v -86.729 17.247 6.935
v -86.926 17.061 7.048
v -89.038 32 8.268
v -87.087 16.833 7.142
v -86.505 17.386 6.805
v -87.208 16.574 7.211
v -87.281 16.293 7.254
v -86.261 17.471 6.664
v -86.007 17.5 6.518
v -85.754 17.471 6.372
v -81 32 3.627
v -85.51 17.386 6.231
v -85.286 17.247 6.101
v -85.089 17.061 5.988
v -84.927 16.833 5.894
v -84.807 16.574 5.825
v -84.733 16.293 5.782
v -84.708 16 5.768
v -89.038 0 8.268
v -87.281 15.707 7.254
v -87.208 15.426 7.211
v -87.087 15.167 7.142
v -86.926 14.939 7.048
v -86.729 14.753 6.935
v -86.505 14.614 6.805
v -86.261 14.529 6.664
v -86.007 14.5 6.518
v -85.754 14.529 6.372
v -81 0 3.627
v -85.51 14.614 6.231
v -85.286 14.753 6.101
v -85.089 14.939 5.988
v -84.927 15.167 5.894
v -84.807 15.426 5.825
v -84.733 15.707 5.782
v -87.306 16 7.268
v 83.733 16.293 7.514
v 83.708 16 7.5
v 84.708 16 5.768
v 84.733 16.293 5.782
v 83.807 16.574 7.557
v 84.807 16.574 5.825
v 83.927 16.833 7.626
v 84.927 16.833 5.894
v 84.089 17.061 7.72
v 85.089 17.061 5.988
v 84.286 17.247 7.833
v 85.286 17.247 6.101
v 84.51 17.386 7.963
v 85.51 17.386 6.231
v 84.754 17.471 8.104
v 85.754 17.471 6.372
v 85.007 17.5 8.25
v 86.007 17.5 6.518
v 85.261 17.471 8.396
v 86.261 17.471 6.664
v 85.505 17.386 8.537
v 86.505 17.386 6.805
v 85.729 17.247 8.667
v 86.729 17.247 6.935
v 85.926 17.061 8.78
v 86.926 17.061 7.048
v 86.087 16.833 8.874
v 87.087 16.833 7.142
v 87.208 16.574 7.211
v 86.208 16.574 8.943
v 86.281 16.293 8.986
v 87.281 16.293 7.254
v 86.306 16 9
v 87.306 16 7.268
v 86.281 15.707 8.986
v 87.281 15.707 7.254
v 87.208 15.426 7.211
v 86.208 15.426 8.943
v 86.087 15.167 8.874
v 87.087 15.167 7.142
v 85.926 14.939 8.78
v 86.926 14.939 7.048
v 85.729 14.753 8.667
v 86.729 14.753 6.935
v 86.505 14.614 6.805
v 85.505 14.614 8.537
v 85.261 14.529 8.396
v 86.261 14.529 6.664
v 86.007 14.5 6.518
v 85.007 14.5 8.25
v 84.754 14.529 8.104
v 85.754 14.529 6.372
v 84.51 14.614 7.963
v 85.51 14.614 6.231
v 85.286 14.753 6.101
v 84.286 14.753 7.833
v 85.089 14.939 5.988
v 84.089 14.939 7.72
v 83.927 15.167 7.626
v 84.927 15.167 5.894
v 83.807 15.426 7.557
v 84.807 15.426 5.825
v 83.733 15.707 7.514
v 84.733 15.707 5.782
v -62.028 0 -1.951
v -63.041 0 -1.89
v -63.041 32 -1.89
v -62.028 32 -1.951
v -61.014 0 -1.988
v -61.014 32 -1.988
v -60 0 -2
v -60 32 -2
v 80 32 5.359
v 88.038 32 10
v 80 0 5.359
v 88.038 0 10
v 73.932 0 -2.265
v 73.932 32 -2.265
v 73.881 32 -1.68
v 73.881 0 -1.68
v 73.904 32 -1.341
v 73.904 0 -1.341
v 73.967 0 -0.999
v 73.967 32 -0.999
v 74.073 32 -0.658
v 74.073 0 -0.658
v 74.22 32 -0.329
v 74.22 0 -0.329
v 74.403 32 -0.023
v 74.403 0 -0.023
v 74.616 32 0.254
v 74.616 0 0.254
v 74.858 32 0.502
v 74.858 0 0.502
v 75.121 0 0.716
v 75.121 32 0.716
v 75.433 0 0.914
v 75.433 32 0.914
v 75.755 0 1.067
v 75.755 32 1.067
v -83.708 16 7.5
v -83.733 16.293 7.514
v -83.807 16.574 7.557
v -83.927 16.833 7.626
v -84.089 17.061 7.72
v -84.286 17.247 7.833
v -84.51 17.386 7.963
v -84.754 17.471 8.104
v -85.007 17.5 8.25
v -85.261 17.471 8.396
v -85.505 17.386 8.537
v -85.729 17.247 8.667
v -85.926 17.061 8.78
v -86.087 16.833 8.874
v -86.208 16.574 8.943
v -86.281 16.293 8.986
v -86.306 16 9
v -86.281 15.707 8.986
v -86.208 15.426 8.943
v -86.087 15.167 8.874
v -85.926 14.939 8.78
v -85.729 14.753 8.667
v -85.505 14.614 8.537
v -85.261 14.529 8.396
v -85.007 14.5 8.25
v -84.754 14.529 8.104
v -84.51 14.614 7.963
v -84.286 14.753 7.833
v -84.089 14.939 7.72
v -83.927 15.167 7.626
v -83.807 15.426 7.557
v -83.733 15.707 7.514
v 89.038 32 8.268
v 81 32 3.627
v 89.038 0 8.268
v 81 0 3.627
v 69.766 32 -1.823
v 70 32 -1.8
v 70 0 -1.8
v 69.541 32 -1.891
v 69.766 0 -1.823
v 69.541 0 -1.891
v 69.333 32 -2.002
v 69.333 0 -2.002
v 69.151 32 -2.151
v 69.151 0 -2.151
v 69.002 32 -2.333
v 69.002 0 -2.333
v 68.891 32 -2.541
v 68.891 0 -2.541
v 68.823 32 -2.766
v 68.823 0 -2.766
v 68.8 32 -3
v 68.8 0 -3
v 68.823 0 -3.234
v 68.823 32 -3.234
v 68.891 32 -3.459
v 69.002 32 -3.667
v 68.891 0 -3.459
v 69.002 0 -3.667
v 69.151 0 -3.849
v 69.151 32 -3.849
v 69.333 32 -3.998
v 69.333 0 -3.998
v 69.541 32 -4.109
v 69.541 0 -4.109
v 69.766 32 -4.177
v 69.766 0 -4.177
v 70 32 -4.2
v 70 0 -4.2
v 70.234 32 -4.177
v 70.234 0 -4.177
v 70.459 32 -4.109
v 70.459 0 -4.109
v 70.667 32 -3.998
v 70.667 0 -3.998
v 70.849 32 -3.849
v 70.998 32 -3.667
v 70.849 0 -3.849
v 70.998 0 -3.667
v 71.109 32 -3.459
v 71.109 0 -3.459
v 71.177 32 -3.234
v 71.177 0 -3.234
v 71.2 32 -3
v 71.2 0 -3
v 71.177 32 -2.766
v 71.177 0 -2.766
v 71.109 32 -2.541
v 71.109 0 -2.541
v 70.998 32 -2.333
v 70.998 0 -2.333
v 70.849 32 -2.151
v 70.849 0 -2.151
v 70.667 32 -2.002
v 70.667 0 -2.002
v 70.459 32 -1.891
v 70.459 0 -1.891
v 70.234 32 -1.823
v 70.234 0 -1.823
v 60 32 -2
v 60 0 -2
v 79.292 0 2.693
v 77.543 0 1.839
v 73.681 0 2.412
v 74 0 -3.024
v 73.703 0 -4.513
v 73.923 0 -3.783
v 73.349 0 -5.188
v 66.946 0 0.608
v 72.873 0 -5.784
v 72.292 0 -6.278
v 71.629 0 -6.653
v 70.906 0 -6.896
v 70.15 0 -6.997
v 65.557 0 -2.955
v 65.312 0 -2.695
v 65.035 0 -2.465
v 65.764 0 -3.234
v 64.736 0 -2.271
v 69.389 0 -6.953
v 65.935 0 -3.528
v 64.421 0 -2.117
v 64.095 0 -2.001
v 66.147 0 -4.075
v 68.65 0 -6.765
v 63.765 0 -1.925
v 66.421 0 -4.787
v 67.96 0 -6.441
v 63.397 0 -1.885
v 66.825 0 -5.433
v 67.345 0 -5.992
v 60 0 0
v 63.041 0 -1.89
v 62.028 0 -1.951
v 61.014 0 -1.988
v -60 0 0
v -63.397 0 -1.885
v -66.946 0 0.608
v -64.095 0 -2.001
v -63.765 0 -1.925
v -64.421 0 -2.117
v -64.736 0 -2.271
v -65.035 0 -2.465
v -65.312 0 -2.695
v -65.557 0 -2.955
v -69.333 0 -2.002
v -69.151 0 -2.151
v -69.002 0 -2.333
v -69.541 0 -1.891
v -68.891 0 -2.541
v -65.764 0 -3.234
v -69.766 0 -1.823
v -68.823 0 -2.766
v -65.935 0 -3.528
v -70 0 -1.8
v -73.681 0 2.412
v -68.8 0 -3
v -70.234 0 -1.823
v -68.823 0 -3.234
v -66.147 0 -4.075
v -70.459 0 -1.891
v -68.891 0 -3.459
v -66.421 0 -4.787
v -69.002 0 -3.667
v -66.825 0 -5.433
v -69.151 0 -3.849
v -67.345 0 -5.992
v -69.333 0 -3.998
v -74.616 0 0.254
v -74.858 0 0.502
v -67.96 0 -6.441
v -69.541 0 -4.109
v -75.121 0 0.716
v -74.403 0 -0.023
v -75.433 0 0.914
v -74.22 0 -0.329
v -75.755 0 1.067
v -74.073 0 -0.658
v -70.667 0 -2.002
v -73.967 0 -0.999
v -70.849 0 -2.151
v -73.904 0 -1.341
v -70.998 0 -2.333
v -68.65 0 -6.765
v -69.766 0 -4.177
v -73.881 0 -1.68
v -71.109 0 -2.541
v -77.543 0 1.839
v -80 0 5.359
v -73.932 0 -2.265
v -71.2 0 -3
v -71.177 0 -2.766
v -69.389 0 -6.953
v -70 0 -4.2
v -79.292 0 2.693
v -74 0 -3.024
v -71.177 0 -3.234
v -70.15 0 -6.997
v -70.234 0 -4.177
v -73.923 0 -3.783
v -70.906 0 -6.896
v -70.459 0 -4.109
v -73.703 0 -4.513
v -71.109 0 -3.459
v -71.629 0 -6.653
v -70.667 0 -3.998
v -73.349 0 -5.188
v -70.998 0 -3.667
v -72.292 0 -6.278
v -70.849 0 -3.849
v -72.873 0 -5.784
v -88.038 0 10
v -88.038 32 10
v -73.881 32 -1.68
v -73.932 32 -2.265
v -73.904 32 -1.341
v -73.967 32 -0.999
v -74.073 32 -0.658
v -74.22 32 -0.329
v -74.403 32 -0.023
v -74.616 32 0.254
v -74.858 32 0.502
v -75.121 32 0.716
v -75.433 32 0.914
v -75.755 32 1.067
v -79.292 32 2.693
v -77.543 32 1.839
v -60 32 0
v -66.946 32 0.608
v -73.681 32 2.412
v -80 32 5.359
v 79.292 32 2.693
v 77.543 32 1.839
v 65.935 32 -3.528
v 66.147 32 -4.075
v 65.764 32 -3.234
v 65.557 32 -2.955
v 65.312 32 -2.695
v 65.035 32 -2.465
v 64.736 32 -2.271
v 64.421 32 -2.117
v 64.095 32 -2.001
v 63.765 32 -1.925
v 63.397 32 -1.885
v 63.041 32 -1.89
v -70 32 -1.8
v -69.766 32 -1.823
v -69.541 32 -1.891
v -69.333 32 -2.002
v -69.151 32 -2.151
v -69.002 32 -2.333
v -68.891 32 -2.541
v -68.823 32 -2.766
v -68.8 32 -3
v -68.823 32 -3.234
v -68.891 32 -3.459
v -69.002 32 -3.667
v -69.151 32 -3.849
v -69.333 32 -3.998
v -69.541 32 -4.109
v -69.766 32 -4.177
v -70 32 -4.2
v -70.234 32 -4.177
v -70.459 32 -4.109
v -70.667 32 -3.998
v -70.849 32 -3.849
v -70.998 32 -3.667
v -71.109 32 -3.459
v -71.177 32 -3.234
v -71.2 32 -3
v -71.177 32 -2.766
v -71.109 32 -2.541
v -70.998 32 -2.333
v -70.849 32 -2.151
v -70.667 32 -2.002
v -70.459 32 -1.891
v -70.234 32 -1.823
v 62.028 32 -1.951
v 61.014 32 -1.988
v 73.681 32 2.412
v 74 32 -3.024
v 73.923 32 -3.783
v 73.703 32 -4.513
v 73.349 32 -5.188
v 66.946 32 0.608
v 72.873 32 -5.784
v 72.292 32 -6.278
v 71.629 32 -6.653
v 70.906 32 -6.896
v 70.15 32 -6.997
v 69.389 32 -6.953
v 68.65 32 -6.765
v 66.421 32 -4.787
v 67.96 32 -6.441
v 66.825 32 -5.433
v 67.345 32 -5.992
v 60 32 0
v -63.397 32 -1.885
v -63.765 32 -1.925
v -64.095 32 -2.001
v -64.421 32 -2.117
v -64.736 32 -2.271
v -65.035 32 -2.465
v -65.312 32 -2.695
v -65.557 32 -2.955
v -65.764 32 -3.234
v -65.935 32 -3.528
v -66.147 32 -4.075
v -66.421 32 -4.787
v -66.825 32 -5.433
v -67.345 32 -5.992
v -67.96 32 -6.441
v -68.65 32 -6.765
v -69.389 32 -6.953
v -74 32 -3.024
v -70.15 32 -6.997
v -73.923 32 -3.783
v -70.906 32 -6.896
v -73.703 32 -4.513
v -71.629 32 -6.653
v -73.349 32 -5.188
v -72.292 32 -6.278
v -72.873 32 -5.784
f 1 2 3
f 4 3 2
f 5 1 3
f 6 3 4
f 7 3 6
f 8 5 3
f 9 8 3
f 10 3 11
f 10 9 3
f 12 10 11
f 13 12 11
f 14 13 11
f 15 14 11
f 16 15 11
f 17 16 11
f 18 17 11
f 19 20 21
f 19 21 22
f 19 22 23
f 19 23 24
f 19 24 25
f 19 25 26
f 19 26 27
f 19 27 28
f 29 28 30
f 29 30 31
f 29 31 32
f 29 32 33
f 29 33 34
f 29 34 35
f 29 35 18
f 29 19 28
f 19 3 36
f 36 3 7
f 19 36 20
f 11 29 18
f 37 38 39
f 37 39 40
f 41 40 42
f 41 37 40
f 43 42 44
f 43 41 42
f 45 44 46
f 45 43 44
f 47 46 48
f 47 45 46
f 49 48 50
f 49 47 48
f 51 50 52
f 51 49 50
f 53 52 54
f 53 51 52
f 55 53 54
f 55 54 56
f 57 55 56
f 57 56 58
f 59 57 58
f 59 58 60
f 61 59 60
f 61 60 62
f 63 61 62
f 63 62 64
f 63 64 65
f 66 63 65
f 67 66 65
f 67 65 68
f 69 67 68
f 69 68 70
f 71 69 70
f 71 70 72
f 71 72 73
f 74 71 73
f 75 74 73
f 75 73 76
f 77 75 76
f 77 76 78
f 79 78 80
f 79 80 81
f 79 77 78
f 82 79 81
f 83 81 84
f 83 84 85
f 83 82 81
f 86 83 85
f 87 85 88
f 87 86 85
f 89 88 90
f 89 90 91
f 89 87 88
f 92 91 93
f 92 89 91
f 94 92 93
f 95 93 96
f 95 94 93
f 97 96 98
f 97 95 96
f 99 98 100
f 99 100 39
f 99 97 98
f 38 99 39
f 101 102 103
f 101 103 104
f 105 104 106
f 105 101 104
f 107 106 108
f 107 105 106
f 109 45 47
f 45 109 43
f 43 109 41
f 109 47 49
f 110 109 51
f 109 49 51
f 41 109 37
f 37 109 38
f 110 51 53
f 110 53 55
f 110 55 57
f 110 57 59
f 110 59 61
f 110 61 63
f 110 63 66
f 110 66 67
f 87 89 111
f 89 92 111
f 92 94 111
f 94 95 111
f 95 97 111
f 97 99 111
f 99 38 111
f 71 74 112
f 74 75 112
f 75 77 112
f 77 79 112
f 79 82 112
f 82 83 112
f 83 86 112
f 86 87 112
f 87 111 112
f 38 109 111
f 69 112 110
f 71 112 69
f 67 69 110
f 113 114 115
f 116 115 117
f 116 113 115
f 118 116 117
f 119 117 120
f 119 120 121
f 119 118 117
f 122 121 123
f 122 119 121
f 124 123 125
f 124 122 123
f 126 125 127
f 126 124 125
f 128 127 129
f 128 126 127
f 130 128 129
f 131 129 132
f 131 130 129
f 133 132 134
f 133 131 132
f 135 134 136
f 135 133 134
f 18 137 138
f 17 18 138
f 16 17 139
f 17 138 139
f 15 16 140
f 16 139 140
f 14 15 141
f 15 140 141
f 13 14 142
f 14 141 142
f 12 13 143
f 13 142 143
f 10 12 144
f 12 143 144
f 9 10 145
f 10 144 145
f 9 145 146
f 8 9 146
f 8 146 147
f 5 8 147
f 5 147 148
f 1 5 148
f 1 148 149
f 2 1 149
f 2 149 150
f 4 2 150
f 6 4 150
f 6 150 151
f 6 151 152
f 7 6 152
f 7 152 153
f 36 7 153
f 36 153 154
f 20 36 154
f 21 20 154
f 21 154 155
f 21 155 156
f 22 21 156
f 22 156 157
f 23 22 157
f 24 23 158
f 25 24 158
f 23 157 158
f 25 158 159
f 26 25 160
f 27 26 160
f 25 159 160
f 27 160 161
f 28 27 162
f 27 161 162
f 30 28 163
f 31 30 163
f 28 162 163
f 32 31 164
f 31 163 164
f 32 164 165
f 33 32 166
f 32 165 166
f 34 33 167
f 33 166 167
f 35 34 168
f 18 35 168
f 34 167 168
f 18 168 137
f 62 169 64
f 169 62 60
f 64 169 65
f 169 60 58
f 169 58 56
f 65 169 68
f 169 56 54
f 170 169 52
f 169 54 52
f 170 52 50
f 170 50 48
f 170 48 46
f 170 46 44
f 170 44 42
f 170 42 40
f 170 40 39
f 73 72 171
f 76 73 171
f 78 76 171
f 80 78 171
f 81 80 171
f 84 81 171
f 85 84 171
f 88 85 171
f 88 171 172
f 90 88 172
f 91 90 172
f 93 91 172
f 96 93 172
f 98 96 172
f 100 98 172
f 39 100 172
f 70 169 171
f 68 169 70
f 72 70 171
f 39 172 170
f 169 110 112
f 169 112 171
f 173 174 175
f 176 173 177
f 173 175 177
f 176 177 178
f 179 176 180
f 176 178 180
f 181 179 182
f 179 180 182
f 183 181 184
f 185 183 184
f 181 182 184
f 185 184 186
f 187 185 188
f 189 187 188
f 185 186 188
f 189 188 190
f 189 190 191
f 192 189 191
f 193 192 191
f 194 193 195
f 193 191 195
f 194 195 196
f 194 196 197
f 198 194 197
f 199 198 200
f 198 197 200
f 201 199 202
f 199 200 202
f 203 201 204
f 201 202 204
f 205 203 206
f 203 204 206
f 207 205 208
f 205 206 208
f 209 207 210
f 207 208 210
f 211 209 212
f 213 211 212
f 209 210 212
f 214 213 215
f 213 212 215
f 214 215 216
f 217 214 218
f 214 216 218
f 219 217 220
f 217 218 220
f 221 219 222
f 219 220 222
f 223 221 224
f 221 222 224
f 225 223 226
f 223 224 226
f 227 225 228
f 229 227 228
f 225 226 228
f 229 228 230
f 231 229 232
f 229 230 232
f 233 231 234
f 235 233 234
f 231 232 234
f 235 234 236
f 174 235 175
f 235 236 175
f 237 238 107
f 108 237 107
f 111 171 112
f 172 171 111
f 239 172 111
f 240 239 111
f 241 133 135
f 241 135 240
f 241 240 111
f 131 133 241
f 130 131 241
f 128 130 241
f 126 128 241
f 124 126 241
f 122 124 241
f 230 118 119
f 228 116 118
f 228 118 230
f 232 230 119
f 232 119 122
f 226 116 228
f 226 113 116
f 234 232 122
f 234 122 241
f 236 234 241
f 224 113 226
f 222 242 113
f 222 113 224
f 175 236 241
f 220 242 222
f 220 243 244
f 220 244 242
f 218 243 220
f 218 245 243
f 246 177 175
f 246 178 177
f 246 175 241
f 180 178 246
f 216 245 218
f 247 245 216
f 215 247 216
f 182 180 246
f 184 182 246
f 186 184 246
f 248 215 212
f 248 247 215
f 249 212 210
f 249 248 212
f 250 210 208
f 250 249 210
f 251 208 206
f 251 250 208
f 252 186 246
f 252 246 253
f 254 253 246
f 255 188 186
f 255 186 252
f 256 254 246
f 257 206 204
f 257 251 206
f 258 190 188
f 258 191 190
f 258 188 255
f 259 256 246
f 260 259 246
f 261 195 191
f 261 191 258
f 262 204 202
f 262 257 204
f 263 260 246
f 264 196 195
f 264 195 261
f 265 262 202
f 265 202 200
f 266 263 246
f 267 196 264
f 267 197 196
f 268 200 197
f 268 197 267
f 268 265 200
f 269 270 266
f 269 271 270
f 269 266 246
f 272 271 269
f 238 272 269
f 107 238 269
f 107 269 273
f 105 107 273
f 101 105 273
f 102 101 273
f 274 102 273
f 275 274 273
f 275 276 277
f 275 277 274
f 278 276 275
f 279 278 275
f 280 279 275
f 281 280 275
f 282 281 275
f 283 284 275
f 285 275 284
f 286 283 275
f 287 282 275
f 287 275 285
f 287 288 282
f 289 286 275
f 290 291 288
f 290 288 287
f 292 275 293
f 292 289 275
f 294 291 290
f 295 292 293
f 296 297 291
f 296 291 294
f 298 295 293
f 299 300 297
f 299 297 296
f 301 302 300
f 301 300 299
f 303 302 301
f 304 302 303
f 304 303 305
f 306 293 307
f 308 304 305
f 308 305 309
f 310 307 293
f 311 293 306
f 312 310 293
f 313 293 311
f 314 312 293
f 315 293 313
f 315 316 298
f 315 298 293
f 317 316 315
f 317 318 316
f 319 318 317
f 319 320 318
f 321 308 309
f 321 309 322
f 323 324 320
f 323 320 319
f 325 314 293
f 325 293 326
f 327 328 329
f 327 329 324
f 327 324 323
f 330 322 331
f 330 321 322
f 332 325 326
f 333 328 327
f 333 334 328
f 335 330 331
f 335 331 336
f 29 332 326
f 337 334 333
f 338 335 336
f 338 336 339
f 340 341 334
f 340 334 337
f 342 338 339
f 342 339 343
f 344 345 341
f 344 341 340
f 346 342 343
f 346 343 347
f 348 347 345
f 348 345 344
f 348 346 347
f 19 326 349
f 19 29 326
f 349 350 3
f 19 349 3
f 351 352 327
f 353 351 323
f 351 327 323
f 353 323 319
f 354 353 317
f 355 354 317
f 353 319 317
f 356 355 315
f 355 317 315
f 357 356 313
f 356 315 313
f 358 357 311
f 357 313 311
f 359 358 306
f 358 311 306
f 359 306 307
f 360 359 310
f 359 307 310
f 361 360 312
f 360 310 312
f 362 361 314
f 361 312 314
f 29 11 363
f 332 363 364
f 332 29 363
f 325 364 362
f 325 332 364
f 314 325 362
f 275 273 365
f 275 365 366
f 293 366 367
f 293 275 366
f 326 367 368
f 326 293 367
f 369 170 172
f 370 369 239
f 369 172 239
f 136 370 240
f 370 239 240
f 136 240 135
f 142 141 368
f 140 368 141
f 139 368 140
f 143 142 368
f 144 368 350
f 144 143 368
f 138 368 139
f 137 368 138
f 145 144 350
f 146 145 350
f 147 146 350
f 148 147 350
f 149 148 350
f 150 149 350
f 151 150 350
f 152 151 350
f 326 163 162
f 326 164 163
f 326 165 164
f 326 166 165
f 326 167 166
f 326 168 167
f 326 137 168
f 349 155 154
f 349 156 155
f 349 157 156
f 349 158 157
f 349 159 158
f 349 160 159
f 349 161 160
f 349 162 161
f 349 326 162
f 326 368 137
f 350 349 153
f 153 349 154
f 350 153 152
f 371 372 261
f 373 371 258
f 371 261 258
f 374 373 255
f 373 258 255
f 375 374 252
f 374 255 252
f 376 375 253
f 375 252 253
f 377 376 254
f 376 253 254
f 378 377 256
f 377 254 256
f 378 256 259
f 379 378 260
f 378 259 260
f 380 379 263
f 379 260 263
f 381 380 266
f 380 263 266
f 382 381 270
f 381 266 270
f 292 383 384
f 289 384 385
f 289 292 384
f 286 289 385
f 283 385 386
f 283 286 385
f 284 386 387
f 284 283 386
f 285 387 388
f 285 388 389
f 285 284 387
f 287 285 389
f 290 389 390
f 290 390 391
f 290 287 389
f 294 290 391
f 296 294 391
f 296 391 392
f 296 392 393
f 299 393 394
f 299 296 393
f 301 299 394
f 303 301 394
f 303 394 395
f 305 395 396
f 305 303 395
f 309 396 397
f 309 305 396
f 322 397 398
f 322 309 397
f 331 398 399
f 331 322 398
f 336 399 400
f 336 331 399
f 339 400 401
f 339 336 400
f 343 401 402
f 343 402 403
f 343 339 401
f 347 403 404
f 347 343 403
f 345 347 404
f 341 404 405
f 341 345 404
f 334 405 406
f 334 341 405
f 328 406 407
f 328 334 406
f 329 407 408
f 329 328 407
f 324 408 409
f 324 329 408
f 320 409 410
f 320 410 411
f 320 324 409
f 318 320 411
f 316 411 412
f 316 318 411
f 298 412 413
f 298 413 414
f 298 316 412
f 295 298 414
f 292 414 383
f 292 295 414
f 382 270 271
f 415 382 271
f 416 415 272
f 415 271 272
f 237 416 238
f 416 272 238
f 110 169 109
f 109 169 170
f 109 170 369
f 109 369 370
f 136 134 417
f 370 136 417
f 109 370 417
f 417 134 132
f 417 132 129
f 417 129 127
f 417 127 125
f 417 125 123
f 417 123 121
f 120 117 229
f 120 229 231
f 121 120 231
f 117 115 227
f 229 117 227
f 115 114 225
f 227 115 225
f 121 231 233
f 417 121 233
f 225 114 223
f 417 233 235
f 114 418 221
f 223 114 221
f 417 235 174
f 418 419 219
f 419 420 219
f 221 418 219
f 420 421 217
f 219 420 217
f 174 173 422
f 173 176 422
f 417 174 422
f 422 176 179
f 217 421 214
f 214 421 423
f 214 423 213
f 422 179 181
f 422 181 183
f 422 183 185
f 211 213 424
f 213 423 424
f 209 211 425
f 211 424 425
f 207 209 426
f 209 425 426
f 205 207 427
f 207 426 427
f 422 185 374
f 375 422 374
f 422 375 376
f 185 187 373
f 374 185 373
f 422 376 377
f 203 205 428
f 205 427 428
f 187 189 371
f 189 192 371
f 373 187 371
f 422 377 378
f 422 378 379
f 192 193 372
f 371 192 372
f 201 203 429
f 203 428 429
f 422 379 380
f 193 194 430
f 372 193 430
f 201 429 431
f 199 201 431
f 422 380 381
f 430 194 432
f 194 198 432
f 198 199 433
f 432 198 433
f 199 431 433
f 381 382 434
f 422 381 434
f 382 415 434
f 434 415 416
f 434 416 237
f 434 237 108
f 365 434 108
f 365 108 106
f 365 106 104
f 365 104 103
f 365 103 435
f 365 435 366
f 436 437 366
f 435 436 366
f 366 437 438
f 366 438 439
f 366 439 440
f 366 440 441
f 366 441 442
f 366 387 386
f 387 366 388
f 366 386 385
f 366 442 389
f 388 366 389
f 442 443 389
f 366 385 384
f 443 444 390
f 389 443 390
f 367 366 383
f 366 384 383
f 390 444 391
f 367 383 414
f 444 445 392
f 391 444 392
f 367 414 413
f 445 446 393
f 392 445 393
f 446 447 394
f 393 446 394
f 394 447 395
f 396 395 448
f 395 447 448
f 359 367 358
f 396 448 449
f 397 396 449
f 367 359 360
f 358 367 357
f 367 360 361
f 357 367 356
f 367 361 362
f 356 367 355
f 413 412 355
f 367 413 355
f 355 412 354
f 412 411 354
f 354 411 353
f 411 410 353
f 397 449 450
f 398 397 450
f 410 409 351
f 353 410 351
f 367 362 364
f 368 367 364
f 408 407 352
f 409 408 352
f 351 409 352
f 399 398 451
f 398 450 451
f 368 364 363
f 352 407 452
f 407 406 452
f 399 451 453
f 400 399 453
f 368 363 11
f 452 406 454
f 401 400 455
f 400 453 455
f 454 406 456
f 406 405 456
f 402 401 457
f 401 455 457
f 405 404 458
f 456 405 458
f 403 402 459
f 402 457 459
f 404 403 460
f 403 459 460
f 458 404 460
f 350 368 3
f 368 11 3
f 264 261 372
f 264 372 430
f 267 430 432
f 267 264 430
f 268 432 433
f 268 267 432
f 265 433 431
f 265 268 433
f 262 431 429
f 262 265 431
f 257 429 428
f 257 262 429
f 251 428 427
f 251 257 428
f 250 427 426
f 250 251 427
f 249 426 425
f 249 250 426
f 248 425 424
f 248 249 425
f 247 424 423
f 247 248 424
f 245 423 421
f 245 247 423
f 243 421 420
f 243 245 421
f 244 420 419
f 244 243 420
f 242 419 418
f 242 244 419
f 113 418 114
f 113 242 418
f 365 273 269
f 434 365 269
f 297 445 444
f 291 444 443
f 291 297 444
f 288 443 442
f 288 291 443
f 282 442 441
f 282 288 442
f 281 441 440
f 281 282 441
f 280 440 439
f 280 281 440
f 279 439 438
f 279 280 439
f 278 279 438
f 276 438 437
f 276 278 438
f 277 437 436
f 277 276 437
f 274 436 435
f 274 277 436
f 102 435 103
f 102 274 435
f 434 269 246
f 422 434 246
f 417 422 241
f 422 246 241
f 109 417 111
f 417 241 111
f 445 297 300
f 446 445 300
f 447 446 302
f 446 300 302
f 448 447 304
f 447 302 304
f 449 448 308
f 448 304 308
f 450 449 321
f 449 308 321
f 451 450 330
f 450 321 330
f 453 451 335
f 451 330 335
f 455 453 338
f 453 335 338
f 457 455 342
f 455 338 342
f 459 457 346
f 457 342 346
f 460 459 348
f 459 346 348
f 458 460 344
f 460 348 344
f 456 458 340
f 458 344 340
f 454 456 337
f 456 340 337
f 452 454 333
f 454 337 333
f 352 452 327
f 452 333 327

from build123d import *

# Parameters (mm, degrees)
EXTRU_MINCE1_DEPTH      = 32
ESQUISSE2_R             = 4
ESQUISSE2_R_2           = 1.2
BOSS_EXTRU_1_DEPTH      = 32
CONG_1_R                = 3
ESQUISSE3_R             = 1.5
ENL_V_MAT_EXTRU_1_DEPTH = 89.126236015


with BuildPart() as part:
    # Esquisse1 → Extru.-Mince1 (new body)
    with BuildSketch(Plane(origin=(0, 0, 0), x_dir=(1, 0, 0), z_dir=(0, 1, 0))):
        with BuildLine():
            Line((0, 0), (-60, 0))
            ThreePointArc((-60, 0), (-70.352761804, -1.362966948), (-80, -5.358983849))
            Line((-80, -5.358983849), (-88.038475773, -10))
            Line((-88.038475773, -10), (-89.038475773, -8.267949192))
            Line((-89.038475773, -8.267949192), (-81, -3.626933041))
            ThreePointArc((-81, -3.626933041), (-70.870399894, 0.568884704), (-60, 2))
            Line((-60, 2), (0, 2))
            Line((0, 2), (0, 0))
        make_face()
    extrude(amount=EXTRU_MINCE1_DEPTH)

    # Esquisse2 → Boss.-Extru.1 (add)
    with BuildSketch(Plane(origin=(0, 0, 0), x_dir=(1, 0, 0), z_dir=(0, 1, 0))):
        with Locations((-70, 3)):
            Circle(ESQUISSE2_R)
        with Locations(Location((-70, 3, 0), (0, 0, 270))):
            Circle(ESQUISSE2_R_2, mode=Mode.SUBTRACT)
    extrude(amount=BOSS_EXTRU_1_DEPTH)

    # Congé1
    cong_1_edges = [part.edges().sort_by_distance(p)[0] for p in [
        (-66.28080804, 16, -1.52771906),
        (-72.687893858, 16, -0.037699103),
    ]]
    fillet(cong_1_edges, radius=CONG_1_R)

    # Esquisse3 → Enlèv. mat.-Extru.1 (cut, through all)
    with BuildSketch(Plane(origin=(-17.679491924, 0, -30.621778265), x_dir=(0.8660254037844379, 0, -0.5000000000000014), z_dir=(0.5000000000000014, 0, 0.8660254037844379))):
        with Locations((-77.74355653, 16)):
            Circle(ESQUISSE3_R)
    extrude(amount=-ENL_V_MAT_EXTRU_1_DEPTH, mode=Mode.SUBTRACT)

    # Symétrie1: part across plane


with BuildPart() as part_1:
    add(part.part)
    add(part.part.mirror(Plane(origin=(0, 32, -2), x_dir=(0, 0, 1), z_dir=(1, 0, 0))))


solid = part_1.part
